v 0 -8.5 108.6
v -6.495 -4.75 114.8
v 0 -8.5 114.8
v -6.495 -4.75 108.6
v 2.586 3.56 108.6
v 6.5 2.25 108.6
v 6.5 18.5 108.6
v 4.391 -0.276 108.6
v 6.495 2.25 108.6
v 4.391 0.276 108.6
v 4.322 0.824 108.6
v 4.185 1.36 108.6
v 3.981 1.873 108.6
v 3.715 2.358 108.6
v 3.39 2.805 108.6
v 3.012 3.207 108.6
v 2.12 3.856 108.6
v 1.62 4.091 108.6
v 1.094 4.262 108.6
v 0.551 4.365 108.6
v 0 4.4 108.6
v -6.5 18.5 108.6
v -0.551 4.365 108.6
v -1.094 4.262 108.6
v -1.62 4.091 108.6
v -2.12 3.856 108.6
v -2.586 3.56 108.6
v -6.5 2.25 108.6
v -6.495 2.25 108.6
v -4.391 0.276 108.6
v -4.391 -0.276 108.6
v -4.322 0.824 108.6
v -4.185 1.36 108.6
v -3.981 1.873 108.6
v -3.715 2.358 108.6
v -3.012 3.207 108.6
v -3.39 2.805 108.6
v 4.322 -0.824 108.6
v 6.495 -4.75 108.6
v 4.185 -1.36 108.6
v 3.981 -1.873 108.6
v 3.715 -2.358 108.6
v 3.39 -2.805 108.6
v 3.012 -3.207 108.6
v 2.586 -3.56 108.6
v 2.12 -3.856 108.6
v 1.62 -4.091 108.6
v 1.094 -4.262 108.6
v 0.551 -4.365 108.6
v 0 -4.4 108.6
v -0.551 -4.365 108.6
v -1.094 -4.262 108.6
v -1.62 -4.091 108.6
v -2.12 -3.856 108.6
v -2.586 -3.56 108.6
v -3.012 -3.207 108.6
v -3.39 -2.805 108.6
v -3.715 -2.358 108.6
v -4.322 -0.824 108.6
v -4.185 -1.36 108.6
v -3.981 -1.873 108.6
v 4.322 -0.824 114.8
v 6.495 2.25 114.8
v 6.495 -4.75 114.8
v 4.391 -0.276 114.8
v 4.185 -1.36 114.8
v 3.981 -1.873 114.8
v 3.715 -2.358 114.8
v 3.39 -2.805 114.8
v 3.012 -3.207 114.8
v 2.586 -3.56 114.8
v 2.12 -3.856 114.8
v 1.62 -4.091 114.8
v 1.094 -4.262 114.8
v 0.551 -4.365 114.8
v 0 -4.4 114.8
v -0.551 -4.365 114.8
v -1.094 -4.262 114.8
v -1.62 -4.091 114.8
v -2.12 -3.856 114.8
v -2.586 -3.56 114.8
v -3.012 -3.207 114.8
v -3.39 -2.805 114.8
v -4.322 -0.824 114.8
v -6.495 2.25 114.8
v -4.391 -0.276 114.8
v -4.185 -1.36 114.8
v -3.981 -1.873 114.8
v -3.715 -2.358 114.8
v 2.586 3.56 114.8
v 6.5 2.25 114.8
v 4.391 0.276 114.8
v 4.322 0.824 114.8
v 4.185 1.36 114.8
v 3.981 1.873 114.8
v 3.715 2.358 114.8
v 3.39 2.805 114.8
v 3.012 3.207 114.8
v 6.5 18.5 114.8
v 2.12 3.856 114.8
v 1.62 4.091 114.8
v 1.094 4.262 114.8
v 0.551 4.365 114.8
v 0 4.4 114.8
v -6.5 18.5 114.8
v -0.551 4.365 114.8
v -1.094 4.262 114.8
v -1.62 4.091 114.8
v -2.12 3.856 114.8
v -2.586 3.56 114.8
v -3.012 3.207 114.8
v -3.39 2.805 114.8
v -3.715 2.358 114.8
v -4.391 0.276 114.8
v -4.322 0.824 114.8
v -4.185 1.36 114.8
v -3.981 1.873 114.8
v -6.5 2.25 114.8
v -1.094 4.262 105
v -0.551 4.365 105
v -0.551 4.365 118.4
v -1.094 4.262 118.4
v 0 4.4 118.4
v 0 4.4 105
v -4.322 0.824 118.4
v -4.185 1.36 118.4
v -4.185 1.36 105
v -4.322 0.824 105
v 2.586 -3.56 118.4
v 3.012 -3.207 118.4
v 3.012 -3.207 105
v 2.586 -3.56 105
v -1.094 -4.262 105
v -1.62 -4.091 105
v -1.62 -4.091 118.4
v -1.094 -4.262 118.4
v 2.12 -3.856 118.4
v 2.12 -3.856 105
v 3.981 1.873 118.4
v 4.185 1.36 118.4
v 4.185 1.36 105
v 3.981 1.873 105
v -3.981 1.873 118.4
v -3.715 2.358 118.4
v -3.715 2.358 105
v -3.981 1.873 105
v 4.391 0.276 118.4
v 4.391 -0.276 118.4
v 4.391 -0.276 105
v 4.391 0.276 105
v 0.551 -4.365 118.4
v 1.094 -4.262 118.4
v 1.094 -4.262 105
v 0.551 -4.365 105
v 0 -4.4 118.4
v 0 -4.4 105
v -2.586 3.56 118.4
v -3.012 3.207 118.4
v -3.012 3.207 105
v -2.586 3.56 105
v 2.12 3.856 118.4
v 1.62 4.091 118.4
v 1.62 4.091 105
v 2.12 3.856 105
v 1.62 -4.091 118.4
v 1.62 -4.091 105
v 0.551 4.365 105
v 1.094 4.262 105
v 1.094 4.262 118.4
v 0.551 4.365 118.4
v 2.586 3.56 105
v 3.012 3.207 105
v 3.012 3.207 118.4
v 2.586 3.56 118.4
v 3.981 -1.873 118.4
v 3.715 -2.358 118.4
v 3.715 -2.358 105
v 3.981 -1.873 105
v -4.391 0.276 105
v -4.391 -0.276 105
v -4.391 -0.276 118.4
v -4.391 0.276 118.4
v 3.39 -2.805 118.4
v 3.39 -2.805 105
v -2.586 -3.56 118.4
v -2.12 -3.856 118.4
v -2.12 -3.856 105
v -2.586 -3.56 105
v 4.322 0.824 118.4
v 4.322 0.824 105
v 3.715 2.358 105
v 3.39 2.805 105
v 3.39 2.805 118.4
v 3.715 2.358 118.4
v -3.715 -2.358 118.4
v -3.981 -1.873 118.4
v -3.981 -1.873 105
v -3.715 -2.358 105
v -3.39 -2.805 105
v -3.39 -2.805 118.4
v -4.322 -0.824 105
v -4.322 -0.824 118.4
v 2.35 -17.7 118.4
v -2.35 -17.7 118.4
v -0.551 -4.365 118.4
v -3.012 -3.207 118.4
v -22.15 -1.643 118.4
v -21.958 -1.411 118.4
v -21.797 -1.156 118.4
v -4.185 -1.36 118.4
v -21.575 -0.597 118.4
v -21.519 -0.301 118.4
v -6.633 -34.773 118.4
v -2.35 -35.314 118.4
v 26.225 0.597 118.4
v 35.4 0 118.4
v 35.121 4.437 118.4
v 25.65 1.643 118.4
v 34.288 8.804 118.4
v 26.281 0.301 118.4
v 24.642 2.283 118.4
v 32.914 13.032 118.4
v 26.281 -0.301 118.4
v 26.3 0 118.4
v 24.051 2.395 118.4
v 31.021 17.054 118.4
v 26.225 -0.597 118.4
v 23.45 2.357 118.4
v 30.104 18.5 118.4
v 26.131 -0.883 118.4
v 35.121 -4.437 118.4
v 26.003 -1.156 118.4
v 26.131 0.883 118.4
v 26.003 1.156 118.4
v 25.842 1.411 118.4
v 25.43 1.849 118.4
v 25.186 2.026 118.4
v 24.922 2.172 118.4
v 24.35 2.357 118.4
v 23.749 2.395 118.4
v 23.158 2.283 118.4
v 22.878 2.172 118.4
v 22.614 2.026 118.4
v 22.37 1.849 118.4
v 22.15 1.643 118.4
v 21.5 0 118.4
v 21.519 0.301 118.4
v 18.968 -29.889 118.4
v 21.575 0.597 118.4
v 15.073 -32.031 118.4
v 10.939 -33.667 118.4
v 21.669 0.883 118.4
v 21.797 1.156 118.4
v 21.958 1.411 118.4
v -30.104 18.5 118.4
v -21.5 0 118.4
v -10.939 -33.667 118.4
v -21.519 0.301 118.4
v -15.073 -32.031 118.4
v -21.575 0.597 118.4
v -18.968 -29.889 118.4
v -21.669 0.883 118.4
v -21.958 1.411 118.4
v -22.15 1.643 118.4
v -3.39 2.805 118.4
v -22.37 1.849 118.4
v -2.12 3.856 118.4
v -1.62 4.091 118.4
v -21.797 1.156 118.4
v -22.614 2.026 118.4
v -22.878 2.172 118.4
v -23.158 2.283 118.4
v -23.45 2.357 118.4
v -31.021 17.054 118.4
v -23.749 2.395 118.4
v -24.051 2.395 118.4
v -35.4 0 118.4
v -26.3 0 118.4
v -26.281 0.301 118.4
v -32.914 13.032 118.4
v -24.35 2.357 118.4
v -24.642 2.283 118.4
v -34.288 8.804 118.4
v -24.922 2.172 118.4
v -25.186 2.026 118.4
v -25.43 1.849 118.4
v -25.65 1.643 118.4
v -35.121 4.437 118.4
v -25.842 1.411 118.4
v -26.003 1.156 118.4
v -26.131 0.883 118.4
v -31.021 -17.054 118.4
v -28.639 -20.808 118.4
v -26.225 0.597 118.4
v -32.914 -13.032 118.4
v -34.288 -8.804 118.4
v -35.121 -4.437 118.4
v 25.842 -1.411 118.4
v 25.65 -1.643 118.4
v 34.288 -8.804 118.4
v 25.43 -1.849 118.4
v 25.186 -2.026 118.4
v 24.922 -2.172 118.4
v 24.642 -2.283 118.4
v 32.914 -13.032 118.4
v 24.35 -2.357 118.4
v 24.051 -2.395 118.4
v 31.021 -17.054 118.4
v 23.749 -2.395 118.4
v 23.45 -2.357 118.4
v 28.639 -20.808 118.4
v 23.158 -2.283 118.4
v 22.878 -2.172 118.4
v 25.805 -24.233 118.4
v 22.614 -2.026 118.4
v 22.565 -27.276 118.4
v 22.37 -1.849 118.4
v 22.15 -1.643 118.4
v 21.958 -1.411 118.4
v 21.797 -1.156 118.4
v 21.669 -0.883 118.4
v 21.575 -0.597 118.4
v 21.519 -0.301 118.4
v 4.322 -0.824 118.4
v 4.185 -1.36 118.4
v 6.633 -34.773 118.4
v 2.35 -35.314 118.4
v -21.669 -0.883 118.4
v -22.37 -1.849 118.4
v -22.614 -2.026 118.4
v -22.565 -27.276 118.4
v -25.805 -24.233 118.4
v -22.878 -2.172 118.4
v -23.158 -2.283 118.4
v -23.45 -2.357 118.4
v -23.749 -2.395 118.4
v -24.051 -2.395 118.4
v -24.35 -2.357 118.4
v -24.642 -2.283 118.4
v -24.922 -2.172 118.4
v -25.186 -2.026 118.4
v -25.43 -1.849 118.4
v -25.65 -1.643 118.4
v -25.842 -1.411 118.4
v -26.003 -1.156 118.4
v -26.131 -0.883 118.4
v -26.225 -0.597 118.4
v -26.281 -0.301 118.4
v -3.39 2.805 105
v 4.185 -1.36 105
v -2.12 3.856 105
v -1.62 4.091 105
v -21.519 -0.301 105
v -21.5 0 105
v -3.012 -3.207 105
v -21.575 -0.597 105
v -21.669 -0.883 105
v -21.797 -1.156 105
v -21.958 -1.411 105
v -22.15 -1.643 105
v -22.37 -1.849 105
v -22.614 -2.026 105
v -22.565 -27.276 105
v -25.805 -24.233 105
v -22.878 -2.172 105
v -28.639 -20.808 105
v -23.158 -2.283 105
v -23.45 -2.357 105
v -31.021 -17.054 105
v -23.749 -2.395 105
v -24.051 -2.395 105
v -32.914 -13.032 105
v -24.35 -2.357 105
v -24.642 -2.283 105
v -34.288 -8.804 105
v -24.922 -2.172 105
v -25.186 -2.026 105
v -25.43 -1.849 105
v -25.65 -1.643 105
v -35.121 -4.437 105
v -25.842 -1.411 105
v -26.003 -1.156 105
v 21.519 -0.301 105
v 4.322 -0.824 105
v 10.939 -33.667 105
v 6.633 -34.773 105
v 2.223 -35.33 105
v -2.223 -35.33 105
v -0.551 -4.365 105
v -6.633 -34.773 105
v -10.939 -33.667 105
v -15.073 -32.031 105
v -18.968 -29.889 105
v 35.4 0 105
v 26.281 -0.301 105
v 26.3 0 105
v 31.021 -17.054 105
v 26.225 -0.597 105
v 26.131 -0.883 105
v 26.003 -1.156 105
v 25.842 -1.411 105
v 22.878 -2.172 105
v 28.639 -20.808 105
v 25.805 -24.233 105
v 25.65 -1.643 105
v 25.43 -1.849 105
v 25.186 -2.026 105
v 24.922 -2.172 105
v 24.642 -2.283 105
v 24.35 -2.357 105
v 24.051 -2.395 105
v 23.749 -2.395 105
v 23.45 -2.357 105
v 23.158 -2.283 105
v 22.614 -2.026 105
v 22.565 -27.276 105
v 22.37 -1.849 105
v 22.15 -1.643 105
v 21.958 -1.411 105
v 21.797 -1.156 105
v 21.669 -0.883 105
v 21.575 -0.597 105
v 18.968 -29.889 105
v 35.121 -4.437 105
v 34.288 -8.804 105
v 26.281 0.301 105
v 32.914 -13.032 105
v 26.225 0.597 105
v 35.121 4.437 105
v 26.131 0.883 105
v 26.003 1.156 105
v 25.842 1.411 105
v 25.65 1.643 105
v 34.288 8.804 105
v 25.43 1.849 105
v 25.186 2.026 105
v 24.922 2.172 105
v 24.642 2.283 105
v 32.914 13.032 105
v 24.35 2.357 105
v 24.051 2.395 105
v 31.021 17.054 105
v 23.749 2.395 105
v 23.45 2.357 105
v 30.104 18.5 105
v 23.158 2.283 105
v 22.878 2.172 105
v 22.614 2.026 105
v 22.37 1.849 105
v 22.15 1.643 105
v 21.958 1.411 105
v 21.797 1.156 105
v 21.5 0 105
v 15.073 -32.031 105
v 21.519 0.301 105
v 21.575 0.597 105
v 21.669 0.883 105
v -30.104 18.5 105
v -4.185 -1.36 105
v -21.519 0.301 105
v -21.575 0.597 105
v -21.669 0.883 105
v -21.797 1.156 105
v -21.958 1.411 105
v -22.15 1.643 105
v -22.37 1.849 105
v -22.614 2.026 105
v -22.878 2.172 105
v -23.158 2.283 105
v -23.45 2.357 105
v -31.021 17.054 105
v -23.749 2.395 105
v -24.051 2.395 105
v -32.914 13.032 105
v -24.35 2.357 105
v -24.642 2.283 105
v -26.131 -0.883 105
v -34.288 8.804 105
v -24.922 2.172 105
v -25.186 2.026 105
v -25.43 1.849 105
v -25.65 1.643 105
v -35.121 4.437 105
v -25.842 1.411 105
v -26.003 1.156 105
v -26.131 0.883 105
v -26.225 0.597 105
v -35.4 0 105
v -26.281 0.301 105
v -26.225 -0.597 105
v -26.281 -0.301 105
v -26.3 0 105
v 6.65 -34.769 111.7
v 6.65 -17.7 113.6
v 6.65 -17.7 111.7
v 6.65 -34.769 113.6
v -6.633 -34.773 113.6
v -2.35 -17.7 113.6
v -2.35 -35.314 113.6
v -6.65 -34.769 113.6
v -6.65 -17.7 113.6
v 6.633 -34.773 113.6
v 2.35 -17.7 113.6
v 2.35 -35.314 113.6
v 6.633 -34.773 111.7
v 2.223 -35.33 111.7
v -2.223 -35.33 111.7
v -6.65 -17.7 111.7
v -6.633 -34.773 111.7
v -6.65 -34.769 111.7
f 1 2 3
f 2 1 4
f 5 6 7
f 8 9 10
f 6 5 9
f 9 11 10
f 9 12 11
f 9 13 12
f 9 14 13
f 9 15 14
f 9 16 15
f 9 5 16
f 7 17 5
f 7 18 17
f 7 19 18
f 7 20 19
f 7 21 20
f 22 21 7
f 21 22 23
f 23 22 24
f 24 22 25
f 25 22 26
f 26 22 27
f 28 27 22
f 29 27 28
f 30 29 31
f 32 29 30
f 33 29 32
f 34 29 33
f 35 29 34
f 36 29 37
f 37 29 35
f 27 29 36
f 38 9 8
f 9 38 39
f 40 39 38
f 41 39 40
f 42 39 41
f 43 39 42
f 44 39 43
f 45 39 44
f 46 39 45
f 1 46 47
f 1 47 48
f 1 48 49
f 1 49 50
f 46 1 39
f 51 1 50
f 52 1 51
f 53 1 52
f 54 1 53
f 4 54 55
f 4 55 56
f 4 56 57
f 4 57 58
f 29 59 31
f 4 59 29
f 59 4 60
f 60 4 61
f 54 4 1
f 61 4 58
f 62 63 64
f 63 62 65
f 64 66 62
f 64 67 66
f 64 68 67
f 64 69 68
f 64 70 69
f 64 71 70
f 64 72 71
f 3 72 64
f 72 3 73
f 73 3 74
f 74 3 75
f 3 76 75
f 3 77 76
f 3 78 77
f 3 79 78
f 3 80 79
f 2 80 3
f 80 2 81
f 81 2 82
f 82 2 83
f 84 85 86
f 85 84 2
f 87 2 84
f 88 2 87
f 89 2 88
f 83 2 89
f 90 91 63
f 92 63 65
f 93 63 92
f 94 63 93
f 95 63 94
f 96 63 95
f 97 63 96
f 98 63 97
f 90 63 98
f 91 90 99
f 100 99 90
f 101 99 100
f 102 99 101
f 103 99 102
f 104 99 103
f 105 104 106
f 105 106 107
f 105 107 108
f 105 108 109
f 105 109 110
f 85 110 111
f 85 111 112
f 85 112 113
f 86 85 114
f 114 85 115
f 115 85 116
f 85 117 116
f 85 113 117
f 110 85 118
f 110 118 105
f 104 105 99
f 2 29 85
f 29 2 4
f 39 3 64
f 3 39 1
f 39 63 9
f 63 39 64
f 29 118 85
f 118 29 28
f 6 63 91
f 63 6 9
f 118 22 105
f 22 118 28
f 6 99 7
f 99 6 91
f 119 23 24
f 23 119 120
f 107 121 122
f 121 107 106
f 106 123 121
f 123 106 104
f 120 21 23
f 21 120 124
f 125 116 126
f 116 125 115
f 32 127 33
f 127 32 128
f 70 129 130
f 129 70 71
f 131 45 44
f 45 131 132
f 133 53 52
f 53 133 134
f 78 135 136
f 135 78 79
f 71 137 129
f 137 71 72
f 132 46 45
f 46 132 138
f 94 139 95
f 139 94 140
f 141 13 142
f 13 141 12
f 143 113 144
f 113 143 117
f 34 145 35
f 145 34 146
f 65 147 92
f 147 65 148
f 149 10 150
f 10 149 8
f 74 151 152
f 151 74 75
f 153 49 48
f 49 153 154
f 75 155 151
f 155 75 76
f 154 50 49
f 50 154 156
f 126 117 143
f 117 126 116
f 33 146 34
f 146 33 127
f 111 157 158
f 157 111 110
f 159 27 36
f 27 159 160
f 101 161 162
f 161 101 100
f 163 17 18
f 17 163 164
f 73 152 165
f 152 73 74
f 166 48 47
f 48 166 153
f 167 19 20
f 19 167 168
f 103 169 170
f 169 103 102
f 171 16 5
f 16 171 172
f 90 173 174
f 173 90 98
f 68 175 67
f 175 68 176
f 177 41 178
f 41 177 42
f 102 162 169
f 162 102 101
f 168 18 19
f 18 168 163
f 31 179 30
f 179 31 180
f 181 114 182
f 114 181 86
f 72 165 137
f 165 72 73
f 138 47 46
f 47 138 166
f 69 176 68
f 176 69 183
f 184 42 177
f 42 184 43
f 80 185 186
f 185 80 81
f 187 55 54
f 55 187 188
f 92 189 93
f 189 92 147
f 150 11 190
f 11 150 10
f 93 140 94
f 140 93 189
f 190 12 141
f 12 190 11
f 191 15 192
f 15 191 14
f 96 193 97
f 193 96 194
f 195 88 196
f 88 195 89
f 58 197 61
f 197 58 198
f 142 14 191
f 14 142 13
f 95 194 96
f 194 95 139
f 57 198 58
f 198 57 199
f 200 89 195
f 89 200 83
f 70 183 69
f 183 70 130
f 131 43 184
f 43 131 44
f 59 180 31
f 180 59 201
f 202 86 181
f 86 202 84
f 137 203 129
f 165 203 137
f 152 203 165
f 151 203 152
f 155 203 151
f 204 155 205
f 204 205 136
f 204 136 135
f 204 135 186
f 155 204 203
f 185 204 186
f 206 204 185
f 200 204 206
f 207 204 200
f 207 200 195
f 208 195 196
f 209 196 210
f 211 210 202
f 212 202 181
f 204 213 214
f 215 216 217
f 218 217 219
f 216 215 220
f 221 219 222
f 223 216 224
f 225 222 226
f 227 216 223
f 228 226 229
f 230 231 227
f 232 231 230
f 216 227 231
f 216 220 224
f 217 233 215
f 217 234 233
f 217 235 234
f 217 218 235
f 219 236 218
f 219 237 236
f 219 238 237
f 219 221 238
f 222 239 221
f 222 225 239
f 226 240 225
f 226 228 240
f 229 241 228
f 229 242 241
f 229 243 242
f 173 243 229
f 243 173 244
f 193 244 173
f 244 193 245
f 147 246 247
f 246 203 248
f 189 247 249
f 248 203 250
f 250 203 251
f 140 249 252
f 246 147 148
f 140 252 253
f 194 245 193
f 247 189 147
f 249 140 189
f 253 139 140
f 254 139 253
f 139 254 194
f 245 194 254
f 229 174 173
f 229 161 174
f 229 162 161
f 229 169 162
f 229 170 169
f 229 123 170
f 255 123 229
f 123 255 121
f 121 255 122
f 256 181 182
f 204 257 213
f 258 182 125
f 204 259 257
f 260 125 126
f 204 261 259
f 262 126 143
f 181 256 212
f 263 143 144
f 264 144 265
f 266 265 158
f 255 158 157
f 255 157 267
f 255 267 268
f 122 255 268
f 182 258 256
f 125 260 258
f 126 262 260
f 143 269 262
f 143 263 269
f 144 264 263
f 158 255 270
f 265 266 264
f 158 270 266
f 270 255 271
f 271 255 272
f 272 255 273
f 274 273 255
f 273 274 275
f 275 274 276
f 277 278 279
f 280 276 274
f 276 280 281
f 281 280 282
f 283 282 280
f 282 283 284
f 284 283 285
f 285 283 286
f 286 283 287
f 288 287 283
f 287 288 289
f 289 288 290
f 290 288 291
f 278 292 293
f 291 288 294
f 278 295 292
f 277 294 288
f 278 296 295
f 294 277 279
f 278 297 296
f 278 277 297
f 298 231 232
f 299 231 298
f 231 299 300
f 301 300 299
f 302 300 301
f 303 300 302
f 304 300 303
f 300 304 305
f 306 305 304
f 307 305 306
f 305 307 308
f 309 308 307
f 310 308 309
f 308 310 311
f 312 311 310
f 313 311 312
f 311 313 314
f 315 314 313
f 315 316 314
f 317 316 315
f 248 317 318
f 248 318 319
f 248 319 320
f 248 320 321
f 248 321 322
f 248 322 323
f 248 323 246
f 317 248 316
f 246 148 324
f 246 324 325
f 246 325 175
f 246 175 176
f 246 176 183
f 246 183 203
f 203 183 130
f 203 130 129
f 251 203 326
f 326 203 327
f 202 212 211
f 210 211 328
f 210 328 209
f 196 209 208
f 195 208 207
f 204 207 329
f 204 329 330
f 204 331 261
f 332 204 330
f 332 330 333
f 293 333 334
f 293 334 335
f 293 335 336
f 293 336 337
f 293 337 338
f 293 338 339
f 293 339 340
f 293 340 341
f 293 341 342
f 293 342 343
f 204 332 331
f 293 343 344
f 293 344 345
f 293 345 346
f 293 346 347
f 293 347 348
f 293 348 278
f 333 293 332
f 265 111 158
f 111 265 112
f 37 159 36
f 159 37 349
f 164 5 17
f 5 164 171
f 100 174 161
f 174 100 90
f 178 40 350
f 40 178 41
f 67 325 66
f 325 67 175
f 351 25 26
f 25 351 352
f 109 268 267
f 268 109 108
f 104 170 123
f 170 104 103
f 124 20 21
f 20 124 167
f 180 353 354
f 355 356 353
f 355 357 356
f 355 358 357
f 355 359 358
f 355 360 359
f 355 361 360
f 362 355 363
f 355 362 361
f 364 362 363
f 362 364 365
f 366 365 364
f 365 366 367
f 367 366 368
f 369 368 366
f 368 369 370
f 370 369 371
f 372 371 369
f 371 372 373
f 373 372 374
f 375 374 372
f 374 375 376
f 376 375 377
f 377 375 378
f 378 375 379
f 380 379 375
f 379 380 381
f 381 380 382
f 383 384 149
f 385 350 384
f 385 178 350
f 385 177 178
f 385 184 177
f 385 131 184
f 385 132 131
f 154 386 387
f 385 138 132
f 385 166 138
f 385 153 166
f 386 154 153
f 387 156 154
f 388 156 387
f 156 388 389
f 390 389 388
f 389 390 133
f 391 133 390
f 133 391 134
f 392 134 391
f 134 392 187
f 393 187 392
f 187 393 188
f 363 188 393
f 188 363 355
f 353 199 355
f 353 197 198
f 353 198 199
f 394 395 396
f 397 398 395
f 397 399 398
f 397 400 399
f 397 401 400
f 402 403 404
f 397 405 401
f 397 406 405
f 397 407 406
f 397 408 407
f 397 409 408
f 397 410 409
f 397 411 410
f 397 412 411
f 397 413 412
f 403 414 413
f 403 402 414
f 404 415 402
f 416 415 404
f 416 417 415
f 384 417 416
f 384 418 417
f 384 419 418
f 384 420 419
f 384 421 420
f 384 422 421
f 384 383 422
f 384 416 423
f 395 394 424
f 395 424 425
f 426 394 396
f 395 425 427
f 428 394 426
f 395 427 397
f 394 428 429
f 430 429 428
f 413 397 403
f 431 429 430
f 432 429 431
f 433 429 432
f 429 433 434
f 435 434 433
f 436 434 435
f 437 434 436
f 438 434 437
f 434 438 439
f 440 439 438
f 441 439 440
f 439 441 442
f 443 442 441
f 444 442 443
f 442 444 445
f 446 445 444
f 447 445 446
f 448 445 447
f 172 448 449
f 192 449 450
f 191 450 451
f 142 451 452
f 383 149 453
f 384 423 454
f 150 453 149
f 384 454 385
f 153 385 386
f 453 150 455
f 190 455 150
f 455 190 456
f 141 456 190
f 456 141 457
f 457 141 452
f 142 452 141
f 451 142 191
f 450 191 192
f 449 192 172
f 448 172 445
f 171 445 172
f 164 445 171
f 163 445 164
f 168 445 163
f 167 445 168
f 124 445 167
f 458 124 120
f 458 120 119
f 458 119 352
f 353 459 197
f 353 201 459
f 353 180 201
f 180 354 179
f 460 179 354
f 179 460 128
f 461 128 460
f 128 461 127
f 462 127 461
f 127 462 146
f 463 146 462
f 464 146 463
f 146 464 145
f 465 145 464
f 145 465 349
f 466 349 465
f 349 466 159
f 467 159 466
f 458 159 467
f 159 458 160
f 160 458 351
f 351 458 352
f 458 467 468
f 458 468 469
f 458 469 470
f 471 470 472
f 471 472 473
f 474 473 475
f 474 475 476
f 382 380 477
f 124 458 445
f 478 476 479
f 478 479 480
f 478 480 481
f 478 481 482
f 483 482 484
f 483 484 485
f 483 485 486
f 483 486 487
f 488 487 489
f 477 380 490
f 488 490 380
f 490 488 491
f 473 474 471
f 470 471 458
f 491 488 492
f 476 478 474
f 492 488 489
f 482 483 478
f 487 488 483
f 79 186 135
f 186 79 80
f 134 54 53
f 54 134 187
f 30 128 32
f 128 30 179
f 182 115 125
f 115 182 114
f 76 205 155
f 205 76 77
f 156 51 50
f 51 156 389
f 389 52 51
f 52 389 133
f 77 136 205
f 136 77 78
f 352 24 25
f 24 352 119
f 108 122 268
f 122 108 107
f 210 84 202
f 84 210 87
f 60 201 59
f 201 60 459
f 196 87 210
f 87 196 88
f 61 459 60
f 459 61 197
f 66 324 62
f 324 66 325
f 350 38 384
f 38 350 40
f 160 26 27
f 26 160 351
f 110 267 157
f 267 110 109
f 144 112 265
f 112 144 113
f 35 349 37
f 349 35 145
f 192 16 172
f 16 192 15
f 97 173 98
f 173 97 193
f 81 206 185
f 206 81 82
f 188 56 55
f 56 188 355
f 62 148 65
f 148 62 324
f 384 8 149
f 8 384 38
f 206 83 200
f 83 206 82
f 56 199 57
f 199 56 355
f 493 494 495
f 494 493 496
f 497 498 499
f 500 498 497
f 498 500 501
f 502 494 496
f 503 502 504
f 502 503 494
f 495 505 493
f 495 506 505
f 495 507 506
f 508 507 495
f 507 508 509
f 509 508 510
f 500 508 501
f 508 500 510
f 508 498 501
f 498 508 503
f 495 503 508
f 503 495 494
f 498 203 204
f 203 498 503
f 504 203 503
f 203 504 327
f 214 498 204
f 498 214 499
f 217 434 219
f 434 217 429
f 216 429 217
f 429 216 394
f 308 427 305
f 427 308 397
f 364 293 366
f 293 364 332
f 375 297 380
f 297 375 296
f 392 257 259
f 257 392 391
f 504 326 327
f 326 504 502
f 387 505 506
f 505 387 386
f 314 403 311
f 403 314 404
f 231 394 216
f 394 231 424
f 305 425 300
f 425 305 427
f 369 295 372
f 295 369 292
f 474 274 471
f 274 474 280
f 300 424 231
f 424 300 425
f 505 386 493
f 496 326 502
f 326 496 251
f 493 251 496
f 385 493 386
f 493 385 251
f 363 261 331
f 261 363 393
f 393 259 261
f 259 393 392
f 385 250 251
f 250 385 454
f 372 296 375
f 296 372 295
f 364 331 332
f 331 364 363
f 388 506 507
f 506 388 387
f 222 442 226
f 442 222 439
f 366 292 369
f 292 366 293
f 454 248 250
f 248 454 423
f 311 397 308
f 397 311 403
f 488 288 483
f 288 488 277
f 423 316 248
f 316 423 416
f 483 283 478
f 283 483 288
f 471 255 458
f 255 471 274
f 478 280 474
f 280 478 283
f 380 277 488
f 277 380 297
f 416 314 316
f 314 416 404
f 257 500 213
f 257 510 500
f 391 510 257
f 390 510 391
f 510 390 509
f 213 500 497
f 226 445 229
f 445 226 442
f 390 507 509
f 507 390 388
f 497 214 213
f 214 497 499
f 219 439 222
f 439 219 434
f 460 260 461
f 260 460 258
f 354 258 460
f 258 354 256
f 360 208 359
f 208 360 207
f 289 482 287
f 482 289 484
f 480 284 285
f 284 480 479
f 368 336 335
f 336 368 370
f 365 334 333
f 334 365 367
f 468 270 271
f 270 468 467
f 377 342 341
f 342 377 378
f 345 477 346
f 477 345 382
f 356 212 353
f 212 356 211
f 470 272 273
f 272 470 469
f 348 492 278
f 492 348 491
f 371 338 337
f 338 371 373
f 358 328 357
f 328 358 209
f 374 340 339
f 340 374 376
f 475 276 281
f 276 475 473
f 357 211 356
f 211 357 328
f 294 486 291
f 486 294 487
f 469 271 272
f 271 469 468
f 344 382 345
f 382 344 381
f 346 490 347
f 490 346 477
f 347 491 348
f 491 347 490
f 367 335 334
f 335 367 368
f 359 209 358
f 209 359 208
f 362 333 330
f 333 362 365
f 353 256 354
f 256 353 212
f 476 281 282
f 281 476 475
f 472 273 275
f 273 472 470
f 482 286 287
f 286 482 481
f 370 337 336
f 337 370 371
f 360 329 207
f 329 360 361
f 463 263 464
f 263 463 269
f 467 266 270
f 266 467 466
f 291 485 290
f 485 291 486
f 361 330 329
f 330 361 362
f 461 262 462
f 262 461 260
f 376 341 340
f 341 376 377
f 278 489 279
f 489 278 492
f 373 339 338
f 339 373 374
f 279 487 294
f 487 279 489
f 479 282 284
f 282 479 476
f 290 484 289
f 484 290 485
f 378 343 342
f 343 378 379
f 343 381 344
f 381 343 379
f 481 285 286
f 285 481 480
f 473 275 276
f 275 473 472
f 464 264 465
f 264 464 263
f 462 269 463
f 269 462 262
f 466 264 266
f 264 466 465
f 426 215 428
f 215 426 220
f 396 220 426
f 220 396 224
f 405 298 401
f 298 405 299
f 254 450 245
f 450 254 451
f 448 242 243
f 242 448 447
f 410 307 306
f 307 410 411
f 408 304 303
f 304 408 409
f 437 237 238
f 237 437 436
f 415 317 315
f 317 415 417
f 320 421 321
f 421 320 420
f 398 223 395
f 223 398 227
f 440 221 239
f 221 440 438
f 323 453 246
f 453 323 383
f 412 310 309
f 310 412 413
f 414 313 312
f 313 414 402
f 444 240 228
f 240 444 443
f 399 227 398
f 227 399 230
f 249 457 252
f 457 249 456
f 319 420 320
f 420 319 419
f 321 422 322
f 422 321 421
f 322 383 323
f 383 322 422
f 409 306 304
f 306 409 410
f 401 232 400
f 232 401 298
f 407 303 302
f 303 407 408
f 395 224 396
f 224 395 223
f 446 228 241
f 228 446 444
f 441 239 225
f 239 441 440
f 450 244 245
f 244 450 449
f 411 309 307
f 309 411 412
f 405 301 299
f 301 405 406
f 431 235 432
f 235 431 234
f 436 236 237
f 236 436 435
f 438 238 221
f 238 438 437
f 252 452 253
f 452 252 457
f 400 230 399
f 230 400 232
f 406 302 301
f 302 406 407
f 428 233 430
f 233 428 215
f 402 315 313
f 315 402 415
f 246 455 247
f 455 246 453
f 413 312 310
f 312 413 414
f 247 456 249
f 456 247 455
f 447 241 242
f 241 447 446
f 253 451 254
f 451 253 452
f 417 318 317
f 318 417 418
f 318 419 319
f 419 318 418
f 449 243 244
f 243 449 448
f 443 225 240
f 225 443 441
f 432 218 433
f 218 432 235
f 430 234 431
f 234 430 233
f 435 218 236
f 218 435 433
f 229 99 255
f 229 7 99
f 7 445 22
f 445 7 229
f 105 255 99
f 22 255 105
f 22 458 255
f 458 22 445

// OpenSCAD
$fn=50;

//syringe
syringe_front_radius= 14.8;
syringe_front_length = 6.3;

syringe_rear_length = 5.4;
syringe_rear_radius = 14.4;

//from middle part
syringe_middle_length = 105;
syringe_middle_radius = 11.5;

shaft_length = 10;
shaft_radius = 2.1;


nut_lenght = 6.2;
nut_side_to_side = 13;

berring_radius = 7.5;
spacing = 2;

rod_distance = berring_radius+spacing+syringe_rear_radius;
extruder_middle_radius = syringe_rear_radius + berring_radius*2 + spacing*6/2;
extruder_middle_length = syringe_rear_length+ spacing*4;

//axis shaft
threaded_rod_radius = 4.4;
syringe_nozzle_length = 20;
syringe_nozzle_radius = 2.5;

//motor ho
motor_holder_length = 5;
//motor
motor_s_radius = 11.5;
motor_s_length = 2;
motor_shaft_radius = 2.6;
motor_screw_radius = 1.5;
from_motor_center_to_screw = 15;

add_a_little_space = 0.3;

//where to press on syringe
syringe_piston_top_radius = 12.7/2+ add_a_little_space;
syringe_piston_top_length = 1.6 +add_a_little_space;

syringe_piston_rod_length = 100; //no need to be exact
syringe_piston_rod_radius = 4.1/2+add_a_little_space;

module circle_extrude(length, radius){
    linear_extrude(length){
        circle(r = radius);
    }
}
module front_part(){
    //Front part
    difference(){
        linear_extrude(extruder_middle_length){
            circle(r = extruder_middle_radius);
        }
        // shaft1
        translate([-rod_distance,0,0]){
            circle_extrude(shaft_length,shaft_radius);
        }

        // shaft2
        translate([rod_distance,0,0]){
            circle_extrude(shaft_length,shaft_radius);
        }
           
        //syringe_front
        translate([0,-(syringe_front_radius+spacing+threaded_rod_radius), (shaft_length-syringe_front_length)/2]){
            circle_extrude(syringe_front_length, syringe_front_radius);
            translate([-syringe_front_radius,-syringe_front_radius*15,0]){
                cube([syringe_front_radius*2,syringe_front_radius*15,syringe_front_length]);
            }
            rotate([180,0,0]){
                //nozzle
                translate([0,0,-0.1]){
                circle_extrude(syringe_nozzle_length+0.2, syringe_nozzle_radius);    
                
                //cuts to insert nozzle
                translate([-syringe_nozzle_radius,0,0]){
                    cube([syringe_nozzle_radius*2,syringe_nozzle_radius*15,syringe_nozzle_length]);
                }
                }
            }
            //syringe body
            circle_extrude(syringe_middle_length, syringe_middle_radius);  
            translate([-syringe_middle_radius,-syringe_middle_radius*15,0]){  
                cube([syringe_middle_radius*2,syringe_middle_radius*15,syringe_middle_length]);
            }
        }
        
        //threaded_rod
        circle_extrude(shaft_length, threaded_rod_radius);
        
        //cut in bottom
         translate([-extruder_middle_radius,berring_radius+spacing,0]){
                cube([extruder_middle_radius*2,extruder_middle_radius*2,extruder_middle_length]);
            }
    }
}

module moror_part()
{
    //motor coupling part
    translate([0,0,200]){
        difference(){
            linear_extrude(motor_holder_length){
                circle(r = extruder_middle_radius);
            }    
            // shaft1
            translate([-rod_distance,0,0]){
                circle_extrude(shaft_length,shaft_radius);
            }

            // shaft2
            translate([rod_distance,0,0]){
                circle_extrude(shaft_length,shaft_radius);
            }
            //motor 
            circle_extrude(motor_s_length, motor_s_radius);
            circle_extrude(shaft_length, motor_shaft_radius);
            
            //motor holder
            translate([from_motor_center_to_screw, from_motor_center_to_screw, 0]){
                circle_extrude(shaft_length, motor_screw_radius);
            }
            translate([-from_motor_center_to_screw,from_motor_center_to_screw,0]){
                circle_extrude(shaft_length, motor_screw_radius);
            }
            translate([-from_motor_center_to_screw,-from_motor_center_to_screw,0]){
                circle_extrude(shaft_length, motor_screw_radius);
            }
             translate([from_motor_center_to_screw,-from_motor_center_to_screw,0]){
                circle_extrude(shaft_length, motor_screw_radius);
            }        
            
            //cut in bottom
            translate([-extruder_middle_radius,from_motor_center_to_screw+motor_screw_radius+spacing,0]){
                cube([extruder_middle_radius*2,extruder_middle_radius*2,extruder_middle_length]);
            }
        }
    }
}


module syringe()
{
    //front
    circle_extrude(syringe_front_length, syringe_front_radius);
    //middle
    circle_extrude(syringe_middle_length, syringe_middle_radius);
    //rear
    translate([0,0,syringe_middle_length-syringe_rear_length]){
        circle_extrude(syringe_rear_length, syringe_rear_radius);
    }        
}
module extruder_middle(){
    
    //part itself
    difference(){
        linear_extrude(extruder_middle_length){
            circle(r = extruder_middle_radius);
        }
        
        // shaft1
        translate([-rod_distance, 0, 0]){
            circle_extrude(extruder_middle_length,shaft_radius + add_a_little_space);
        }

        // shaft2
        translate([rod_distance, 0, 0]){
            circle_extrude(extruder_middle_length, shaft_radius + add_a_little_space);
        }
        
       //hex cut
        rotate([0,0,90]){
            translate([-1,0,(extruder_middle_length-nut_lenght)/2]){
                linear_extrude(nut_lenght){
                    circle(d=15, $fn=6);             
                }
                translate([nut_side_to_side/4,-nut_side_to_side/2, 0]){
                    cube([25,nut_side_to_side,nut_lenght]);
                }
            }
             //threaded_rod
        circle_extrude(extruder_middle_length, threaded_rod_radius);
        }
        
        //cut for piston
        translate([0,-extruder_middle_radius/2,extruder_middle_length/2]){
            syringe_piston();
        }
        
         //cut in bottom
            translate([-extruder_middle_radius,from_motor_center_to_screw+motor_screw_radius+spacing,0]){
                cube([extruder_middle_radius*2,extruder_middle_radius*2,extruder_middle_length]);
            }
    }
    
}
module syringe_piston(){
    linear_extrude(syringe_piston_top_length, syringe_piston_top_radius);    
    linear_extrude(syringe_piston_rod_length, syringe_piston_rod_radius);
    
    //cuts to insert syringe rod
    translate([-syringe_piston_top_radius,-syringe_piston_top_radius*5,0]){
        cube([syringe_piston_top_radius*2,syringe_piston_top_radius*5,syringe_piston_top_length]);
    }
    
    translate([-syringe_piston_rod_radius,-syringe_piston_rod_radius*15,0]){
        cube([syringe_piston_rod_radius*2,syringe_piston_rod_radius*15,syringe_piston_rod_length]);
    }
}

//front_part();
//moror_part();
translate([0,-(syringe_front_radius+spacing+threaded_rod_radius), (shaft_length-syringe_front_length)/2]){
//    syringe();    
}
translate([0,0, syringe_middle_length]){
    extruder_middle();
}



